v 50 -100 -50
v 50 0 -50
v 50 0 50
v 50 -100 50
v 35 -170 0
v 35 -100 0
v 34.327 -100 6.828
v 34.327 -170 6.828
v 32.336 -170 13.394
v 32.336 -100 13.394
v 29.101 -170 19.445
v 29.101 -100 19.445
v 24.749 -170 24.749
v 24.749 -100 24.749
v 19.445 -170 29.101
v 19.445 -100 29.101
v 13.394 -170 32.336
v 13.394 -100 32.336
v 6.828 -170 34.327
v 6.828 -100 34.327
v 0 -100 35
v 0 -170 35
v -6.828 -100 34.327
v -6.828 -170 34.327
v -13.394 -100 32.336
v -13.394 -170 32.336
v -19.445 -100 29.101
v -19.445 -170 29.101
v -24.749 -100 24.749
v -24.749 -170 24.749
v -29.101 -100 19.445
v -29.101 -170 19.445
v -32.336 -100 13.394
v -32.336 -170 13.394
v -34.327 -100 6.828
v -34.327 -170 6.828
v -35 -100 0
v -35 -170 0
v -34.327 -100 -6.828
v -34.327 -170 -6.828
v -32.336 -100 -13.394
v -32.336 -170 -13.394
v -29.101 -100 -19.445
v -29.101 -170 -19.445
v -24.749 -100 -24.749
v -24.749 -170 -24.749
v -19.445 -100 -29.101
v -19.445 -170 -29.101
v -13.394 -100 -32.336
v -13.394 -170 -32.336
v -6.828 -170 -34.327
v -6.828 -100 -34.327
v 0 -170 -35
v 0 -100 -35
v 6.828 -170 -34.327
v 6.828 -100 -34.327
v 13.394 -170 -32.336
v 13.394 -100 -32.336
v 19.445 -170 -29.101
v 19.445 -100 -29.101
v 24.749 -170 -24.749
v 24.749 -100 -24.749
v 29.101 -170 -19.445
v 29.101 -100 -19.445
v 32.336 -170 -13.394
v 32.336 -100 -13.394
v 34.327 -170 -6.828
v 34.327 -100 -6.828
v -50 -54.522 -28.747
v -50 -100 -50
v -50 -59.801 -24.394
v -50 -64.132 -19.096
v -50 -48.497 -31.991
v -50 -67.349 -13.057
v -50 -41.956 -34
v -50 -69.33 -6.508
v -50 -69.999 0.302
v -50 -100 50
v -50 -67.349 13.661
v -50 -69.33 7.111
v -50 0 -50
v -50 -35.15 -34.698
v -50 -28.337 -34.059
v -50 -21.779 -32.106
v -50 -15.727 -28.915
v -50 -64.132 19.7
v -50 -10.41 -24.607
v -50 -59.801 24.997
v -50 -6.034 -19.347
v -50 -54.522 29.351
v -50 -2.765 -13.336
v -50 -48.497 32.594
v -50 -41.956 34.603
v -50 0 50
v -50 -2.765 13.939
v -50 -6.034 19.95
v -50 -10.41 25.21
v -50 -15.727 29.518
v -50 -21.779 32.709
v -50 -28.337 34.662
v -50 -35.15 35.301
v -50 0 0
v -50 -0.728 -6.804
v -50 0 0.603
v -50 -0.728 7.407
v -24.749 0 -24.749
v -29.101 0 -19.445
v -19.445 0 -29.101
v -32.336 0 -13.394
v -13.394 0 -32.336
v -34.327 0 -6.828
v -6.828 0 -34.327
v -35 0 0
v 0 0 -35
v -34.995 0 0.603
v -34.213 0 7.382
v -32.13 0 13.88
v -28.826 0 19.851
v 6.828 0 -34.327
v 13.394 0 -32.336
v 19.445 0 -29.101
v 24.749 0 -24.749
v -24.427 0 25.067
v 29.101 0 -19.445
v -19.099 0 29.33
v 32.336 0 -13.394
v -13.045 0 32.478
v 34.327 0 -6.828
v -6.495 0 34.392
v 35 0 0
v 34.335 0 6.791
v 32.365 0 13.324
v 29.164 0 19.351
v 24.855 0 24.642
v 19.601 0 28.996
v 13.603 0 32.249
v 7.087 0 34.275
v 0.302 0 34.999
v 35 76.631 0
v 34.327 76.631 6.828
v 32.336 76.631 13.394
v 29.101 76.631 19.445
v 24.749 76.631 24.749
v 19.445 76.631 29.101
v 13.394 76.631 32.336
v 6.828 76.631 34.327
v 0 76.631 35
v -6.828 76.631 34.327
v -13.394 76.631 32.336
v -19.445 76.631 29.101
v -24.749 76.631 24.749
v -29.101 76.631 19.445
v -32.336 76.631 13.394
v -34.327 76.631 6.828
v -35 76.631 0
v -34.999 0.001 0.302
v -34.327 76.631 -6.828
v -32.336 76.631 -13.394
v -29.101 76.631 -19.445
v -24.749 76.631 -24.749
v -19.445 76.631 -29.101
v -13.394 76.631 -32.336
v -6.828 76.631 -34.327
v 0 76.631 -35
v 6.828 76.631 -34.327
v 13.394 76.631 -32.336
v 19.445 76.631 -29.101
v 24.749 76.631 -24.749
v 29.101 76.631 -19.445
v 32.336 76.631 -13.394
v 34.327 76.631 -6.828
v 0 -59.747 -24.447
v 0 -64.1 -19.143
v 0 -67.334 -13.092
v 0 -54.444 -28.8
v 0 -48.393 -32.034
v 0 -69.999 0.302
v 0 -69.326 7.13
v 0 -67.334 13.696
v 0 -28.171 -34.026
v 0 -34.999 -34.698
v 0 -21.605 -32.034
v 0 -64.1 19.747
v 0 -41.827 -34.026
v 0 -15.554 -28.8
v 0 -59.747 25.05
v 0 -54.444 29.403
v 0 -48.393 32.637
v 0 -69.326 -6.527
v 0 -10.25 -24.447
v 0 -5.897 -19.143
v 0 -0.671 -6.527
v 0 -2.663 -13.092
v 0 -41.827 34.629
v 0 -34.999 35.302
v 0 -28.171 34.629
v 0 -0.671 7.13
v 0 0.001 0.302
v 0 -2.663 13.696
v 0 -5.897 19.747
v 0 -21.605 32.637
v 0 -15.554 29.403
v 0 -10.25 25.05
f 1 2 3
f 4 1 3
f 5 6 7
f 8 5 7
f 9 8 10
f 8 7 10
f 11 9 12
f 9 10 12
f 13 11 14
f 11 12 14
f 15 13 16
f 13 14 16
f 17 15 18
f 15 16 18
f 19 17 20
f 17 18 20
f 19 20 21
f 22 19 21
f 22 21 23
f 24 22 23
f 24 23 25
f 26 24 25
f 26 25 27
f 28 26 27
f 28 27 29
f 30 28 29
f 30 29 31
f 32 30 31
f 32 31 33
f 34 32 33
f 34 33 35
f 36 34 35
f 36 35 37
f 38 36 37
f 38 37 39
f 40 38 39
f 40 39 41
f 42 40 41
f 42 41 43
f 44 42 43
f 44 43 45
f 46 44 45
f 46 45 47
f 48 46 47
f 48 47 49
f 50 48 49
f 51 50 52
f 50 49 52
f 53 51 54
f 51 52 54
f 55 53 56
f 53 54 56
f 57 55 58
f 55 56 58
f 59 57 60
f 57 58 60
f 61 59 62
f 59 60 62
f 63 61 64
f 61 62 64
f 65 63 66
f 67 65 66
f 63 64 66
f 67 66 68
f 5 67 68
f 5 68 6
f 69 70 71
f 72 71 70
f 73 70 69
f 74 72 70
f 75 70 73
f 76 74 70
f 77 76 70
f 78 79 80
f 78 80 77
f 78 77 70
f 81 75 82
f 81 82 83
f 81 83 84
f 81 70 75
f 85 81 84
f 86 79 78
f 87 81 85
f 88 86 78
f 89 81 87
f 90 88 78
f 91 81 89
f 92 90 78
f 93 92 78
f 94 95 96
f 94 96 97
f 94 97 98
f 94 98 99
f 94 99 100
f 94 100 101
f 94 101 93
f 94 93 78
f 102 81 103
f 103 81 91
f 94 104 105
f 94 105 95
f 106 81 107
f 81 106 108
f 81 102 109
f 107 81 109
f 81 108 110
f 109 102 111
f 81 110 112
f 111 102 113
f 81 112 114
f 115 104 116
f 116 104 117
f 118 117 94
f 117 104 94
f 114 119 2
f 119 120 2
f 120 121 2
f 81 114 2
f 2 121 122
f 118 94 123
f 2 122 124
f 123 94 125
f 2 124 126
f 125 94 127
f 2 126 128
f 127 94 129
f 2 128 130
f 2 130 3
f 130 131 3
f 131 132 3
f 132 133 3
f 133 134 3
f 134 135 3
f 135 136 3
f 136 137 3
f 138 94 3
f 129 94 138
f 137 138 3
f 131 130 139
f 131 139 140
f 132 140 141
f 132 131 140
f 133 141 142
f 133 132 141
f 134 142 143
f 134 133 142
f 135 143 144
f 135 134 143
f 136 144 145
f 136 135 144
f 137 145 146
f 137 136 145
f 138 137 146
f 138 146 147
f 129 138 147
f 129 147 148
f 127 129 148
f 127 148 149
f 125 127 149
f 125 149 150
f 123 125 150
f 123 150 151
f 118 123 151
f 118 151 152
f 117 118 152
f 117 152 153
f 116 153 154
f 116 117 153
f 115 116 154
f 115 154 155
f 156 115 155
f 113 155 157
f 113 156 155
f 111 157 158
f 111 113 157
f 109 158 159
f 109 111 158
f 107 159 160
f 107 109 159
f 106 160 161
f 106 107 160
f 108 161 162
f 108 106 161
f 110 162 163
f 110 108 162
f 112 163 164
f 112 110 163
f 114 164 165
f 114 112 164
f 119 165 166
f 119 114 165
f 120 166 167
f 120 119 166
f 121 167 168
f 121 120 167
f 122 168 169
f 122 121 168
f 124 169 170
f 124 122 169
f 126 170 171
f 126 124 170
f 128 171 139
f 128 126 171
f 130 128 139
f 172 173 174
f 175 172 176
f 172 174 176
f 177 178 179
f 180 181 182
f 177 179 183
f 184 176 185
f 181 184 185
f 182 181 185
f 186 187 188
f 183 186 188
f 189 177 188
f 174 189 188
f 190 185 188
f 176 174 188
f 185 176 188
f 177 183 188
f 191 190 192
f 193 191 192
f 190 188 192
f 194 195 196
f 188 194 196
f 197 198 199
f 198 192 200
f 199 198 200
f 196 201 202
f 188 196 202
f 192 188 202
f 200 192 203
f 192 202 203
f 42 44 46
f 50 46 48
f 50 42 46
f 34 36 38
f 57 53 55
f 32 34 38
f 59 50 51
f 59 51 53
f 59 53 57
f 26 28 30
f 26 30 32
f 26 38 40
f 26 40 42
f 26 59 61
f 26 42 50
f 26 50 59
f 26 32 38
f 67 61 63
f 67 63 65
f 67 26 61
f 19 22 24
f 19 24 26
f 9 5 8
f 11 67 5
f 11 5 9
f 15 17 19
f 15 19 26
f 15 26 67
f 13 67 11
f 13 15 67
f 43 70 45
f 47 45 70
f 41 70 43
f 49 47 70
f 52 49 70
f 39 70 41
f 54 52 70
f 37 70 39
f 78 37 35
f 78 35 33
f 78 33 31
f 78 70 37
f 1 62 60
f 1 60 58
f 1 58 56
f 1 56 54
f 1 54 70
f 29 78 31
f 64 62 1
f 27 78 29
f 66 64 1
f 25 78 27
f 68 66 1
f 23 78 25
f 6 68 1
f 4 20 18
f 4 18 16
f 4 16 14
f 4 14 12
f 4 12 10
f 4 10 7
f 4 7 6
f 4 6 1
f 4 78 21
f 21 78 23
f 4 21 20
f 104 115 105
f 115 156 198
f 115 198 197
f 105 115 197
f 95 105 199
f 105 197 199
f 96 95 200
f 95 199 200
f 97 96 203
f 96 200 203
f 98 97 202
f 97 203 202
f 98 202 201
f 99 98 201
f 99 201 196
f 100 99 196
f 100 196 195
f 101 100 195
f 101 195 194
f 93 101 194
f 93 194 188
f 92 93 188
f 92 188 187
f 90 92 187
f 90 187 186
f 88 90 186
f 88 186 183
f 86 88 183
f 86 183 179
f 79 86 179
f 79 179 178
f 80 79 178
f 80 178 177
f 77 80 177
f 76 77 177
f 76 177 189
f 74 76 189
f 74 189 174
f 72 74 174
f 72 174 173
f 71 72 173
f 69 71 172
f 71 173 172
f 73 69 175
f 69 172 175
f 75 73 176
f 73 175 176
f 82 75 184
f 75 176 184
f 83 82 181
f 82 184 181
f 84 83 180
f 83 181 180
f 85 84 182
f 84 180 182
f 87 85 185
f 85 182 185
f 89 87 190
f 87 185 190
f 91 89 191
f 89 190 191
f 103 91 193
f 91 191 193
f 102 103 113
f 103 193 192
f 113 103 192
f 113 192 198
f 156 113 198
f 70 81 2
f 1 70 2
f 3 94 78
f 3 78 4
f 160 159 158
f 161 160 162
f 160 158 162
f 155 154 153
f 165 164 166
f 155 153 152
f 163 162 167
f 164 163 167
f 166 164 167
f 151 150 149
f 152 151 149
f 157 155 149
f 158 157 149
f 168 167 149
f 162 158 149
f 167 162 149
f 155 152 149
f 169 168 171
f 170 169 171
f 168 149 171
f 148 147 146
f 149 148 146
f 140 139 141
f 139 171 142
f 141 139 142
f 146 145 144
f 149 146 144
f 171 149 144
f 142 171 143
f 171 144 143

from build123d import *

# Parameters (mm, degrees)
F0_W          = 100
F0_H          = 100
F1_DEPTH      = 100
F2_R          = 35
F3_DEPTH      = 170
F4_R          = 35
F5_DEPTH      = 161.955625
F5_DEPTH_BACK = 76.630928
F6_R          = 35
F7_DEPTH      = 1320.8


with BuildPart() as f1:
    # F0 (on Front) → F1 (new body)
    with BuildSketch(Plane.XZ):
        Rectangle(F0_W, F0_H)
    extrude(amount=F1_DEPTH)

    # F2 (on Front) → F3 (join)
    with BuildSketch(Plane.XZ):
        Circle(F2_R)
    extrude(amount=F3_DEPTH)

    # F4 (on Front) → F5 (join, two sides)
    with BuildSketch(Plane.XZ) as f5_sk:
        Circle(F4_R)
    extrude(amount=F5_DEPTH)
    extrude(f5_sk.sketch, amount=-F5_DEPTH_BACK)

    # F6 (on Right) → F7 (cut)
    with BuildSketch(Plane.YZ):
        with Locations((-34.9987, 0.301605)):
            Circle(F6_R)
    extrude(amount=-F7_DEPTH, mode=Mode.SUBTRACT)


solid = f1.part
